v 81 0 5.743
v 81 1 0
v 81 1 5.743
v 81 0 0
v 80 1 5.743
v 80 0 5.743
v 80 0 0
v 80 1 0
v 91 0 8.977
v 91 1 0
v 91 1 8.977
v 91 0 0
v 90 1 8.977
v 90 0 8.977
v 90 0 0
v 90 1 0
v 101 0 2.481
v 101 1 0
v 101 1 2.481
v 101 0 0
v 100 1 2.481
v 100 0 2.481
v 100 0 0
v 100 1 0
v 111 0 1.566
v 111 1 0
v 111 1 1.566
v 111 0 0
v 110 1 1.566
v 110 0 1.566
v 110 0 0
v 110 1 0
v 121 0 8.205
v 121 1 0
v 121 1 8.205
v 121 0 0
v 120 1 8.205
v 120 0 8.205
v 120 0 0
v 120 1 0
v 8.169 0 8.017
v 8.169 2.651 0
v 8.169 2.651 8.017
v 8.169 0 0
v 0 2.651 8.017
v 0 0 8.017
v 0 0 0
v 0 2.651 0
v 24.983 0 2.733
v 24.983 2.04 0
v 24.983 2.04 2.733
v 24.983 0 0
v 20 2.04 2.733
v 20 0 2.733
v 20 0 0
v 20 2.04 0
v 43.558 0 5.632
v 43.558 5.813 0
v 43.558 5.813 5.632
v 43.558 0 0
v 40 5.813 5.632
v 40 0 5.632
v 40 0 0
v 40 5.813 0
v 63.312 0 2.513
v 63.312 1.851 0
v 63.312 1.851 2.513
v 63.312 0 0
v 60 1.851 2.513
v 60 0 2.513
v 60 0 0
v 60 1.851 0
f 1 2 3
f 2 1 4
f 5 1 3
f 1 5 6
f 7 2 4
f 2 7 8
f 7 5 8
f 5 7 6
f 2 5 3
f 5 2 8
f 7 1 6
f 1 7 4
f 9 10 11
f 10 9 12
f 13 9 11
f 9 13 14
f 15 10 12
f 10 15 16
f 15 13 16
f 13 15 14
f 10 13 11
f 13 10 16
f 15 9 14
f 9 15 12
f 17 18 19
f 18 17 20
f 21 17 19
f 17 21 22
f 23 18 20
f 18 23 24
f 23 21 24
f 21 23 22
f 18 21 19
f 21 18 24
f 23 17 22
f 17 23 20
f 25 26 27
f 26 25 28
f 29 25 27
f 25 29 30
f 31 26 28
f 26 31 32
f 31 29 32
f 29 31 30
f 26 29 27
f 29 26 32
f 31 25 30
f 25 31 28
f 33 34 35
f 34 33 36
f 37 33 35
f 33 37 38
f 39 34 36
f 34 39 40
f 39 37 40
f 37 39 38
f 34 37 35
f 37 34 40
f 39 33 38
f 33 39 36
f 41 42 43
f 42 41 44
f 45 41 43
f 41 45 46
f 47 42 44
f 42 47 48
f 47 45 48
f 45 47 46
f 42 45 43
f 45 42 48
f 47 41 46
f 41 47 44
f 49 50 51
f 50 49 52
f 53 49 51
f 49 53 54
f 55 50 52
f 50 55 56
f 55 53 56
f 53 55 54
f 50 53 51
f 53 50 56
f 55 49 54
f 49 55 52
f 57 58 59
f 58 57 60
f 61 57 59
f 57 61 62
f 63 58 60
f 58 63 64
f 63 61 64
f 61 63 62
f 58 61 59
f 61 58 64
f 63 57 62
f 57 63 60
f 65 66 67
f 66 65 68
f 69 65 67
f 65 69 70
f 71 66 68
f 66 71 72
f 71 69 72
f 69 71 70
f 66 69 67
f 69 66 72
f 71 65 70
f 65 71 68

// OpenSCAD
// rands() with a seed is OpenSCAD's own sequence, bit for bit: every value below becomes a size
cube(rands(1, 10, 3, 42));
translate([20, 0, 0]) cube(rands(2, 5, 3, 42.9));          // a fractional seed is hashed, not truncated
translate([40, 0, 0]) cube(rands(8, 3, 3, -1));            // min > max swaps; a negative seed wraps
translate([60, 0, 0]) cube(rands(1, 4, 3));                // unseeded: continues the seed -1 stream
for (i = [0 : 4]) translate([80 + i * 10, 0, 0]) cube([1, 1, rands(1, 9, 1, i)[0]]);
